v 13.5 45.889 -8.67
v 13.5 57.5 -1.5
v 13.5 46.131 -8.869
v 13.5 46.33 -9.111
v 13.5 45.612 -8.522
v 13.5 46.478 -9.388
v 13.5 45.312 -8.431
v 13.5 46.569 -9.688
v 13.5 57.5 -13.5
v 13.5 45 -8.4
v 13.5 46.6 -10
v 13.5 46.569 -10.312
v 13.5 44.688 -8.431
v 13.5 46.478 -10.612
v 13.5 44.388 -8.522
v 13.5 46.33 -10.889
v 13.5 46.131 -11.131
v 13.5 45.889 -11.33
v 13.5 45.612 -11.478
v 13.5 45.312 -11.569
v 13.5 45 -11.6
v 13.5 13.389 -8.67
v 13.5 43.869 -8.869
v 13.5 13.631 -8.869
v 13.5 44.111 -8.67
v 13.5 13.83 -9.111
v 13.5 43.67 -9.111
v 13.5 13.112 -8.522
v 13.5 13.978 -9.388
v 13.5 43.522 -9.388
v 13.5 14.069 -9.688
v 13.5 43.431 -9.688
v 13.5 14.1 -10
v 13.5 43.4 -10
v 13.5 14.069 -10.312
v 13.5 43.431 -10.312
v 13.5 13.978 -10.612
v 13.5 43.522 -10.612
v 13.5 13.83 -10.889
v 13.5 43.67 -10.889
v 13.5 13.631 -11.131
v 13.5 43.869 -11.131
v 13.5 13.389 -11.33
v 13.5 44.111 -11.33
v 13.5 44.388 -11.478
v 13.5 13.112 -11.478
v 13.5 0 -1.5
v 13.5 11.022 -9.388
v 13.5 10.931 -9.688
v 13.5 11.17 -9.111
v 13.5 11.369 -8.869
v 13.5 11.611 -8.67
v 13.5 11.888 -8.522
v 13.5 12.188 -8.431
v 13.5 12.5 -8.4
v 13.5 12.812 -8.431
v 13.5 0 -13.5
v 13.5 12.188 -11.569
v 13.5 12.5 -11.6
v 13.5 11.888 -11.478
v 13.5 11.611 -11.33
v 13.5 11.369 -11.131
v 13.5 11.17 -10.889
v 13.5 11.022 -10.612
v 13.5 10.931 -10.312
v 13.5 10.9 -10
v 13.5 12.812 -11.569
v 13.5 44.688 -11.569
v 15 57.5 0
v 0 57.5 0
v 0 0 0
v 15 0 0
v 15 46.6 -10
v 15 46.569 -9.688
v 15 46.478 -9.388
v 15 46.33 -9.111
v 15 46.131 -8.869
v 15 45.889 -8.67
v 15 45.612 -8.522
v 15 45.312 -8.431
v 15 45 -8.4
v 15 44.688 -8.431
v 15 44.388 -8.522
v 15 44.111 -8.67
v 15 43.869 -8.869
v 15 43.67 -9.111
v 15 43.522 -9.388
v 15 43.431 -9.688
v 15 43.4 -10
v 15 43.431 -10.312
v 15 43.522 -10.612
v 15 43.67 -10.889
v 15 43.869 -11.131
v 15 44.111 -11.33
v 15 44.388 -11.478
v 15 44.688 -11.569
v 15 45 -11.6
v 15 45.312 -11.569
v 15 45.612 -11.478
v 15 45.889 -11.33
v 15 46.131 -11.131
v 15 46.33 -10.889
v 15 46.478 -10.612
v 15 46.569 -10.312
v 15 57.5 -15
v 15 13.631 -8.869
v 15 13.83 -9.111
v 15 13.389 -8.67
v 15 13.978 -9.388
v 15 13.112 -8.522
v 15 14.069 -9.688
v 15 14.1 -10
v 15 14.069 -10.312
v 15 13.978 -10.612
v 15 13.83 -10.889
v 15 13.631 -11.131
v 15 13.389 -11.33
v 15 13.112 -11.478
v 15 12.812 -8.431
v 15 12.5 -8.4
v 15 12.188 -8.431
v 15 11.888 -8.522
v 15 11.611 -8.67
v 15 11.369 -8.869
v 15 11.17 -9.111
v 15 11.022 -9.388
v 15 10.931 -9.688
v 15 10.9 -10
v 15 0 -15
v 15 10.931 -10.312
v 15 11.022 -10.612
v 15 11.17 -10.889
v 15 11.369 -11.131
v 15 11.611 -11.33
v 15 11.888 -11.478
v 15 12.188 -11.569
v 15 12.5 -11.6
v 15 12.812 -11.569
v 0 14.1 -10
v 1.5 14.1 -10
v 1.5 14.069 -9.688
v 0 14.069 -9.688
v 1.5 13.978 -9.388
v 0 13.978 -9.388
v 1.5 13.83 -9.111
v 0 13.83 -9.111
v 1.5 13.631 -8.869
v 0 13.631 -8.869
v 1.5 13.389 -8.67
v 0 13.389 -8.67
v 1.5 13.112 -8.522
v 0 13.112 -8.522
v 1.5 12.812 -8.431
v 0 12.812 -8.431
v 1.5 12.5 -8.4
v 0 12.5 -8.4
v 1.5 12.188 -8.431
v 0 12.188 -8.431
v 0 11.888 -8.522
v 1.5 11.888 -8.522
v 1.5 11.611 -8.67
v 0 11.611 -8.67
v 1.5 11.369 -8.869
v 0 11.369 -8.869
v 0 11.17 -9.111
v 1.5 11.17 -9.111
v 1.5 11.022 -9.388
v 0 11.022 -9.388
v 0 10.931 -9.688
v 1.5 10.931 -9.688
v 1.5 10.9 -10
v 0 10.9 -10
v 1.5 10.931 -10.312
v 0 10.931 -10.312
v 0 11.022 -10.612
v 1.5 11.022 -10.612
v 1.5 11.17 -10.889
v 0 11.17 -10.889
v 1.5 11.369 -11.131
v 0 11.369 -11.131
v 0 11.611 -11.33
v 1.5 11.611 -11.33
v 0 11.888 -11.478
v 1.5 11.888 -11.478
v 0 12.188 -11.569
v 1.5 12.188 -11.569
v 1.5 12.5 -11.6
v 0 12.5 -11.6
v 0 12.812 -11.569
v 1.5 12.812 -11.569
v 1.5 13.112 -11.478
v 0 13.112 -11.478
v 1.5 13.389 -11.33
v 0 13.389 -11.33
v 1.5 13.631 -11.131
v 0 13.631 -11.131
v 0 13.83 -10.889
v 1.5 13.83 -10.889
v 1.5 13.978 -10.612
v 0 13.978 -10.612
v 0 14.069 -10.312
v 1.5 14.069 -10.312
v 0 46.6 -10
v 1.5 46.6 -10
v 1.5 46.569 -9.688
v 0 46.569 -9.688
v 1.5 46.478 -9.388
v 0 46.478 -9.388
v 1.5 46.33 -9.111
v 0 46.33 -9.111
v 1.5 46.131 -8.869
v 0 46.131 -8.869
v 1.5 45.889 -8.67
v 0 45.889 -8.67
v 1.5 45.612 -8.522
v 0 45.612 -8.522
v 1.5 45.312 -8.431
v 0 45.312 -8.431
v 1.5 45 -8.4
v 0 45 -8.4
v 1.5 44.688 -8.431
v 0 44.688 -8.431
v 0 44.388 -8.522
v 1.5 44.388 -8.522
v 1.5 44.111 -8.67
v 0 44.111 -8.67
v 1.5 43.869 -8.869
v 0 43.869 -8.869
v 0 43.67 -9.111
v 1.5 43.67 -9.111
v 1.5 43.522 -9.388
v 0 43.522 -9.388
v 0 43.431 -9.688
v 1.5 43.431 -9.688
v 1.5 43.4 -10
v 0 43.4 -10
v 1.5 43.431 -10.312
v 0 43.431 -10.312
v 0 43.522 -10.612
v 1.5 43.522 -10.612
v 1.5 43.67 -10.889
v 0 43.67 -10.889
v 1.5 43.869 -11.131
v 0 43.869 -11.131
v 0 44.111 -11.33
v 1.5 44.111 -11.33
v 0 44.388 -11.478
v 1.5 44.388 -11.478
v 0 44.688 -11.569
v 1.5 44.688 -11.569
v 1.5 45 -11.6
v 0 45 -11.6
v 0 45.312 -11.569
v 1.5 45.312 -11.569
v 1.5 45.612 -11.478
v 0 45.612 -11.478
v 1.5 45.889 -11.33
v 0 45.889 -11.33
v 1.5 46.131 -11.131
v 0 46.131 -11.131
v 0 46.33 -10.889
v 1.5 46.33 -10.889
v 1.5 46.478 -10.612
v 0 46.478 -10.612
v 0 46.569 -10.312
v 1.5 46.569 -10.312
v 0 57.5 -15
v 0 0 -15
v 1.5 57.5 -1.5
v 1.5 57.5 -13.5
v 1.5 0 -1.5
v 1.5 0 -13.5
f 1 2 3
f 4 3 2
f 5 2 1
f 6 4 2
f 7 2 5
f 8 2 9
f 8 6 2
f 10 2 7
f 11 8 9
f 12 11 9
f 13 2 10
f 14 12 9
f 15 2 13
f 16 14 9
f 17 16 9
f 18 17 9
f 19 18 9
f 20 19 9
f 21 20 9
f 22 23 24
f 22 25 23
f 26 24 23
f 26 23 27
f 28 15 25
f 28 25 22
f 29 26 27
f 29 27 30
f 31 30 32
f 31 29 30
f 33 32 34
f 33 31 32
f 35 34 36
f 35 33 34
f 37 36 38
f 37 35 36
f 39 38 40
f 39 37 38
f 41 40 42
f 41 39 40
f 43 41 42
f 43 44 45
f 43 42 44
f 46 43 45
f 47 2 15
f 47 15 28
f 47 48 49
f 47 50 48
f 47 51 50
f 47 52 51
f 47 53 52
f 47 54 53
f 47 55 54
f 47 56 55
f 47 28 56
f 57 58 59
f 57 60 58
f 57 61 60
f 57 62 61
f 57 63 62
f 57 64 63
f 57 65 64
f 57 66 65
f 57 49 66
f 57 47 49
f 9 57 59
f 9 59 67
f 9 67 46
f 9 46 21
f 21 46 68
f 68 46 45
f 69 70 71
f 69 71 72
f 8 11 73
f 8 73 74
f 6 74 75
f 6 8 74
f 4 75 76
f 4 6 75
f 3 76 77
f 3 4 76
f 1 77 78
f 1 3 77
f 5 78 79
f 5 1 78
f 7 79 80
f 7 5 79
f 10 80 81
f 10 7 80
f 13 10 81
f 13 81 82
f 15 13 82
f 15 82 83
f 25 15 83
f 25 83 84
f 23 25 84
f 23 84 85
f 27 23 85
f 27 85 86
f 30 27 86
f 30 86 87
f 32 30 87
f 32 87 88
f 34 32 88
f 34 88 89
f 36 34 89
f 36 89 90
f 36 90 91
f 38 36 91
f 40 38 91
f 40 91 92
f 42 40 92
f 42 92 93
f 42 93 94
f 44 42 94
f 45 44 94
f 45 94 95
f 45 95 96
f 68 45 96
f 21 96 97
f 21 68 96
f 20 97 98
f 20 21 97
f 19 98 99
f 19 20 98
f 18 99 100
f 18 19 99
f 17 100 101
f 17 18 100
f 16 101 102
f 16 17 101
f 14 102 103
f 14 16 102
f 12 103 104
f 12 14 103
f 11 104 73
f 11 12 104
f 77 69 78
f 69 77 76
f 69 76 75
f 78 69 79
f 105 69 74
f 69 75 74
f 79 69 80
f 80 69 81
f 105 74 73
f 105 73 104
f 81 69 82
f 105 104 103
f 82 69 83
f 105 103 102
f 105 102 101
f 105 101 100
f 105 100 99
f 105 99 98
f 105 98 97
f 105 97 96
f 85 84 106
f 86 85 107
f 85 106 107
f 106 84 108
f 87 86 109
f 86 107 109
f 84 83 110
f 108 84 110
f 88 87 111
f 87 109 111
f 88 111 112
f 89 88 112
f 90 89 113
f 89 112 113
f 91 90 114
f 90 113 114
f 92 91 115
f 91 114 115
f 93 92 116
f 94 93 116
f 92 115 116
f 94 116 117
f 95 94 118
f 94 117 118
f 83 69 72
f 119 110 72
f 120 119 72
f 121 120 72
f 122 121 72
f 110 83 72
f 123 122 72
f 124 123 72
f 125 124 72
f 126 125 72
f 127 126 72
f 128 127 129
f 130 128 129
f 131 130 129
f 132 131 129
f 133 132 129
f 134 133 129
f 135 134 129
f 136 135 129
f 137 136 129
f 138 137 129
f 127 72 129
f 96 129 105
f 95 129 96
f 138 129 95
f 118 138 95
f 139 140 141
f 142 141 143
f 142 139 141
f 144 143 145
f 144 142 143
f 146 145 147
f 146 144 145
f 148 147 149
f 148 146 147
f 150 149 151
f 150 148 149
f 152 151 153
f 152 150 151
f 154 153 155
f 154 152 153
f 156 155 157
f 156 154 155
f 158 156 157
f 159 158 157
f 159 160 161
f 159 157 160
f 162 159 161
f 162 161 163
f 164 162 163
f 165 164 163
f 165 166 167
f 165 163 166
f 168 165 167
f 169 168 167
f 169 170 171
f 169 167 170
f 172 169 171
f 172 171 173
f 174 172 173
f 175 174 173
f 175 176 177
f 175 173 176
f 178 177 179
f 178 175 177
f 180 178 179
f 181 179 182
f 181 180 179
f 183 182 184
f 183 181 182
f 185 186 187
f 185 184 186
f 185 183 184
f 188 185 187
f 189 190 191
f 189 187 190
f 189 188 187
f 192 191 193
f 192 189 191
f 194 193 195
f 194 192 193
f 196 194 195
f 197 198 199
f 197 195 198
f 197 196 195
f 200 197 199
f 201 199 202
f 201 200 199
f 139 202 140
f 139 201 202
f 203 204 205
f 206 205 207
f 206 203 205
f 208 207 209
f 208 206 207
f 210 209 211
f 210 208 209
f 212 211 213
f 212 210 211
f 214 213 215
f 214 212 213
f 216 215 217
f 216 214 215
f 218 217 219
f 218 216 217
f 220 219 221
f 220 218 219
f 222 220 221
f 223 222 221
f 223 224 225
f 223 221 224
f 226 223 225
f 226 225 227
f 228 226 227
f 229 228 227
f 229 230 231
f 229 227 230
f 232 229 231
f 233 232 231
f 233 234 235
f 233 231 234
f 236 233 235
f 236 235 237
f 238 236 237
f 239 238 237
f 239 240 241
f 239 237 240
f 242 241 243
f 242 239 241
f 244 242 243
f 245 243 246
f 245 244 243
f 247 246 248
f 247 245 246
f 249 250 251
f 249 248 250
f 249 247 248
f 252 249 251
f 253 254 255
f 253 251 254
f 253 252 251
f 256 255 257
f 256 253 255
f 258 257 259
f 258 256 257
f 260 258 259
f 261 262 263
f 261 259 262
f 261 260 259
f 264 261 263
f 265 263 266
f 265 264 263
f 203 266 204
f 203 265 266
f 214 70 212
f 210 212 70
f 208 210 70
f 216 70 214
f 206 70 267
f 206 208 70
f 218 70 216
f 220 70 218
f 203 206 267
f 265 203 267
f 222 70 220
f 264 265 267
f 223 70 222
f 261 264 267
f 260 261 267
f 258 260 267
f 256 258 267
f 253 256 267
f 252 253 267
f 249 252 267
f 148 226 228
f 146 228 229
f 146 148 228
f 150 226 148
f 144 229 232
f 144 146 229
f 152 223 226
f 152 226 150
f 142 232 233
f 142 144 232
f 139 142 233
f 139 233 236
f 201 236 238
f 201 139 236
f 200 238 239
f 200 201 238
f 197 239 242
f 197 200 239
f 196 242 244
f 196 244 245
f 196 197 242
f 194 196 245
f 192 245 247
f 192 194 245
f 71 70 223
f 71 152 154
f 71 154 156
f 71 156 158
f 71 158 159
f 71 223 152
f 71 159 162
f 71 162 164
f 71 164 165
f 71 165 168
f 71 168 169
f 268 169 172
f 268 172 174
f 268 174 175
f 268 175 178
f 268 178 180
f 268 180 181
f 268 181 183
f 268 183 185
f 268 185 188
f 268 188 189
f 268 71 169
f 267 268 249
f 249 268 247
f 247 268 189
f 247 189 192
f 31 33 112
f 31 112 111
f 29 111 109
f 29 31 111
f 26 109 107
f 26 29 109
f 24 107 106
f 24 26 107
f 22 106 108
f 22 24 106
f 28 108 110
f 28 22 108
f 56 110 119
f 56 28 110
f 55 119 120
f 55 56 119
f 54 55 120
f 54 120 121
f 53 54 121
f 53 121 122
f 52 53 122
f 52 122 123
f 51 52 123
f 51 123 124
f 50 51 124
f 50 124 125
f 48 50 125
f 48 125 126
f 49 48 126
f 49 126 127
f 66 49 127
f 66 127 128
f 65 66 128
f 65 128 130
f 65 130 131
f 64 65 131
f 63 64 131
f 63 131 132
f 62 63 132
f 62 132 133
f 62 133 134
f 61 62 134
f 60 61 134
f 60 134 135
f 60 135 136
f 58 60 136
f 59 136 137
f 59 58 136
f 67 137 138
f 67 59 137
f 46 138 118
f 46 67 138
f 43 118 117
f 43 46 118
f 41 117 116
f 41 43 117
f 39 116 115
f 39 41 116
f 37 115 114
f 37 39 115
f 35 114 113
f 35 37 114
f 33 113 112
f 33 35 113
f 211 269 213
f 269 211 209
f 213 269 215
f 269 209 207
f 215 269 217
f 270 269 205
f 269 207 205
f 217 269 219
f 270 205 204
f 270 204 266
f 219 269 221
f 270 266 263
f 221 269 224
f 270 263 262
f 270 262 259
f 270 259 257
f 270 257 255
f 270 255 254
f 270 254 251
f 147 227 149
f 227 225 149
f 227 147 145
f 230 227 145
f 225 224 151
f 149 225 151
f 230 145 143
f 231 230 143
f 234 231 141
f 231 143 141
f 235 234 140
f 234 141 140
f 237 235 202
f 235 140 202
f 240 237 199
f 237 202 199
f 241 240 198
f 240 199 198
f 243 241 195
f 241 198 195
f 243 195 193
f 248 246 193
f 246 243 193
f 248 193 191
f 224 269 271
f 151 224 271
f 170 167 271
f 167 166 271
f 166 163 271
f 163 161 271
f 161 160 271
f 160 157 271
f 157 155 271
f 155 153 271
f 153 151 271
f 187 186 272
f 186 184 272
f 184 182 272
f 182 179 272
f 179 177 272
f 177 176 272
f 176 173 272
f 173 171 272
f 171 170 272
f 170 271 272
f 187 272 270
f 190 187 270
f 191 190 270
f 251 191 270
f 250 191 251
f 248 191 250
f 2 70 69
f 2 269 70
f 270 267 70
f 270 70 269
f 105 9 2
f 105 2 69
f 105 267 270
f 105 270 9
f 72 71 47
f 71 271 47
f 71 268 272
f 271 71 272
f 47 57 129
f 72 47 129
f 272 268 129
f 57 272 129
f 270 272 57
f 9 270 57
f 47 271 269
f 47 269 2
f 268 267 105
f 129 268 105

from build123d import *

# Parameters (mm, degrees)
SKETCH_1_W              = 15
SKETCH_1_H              = 15
SKETCH_1_W_2            = 12
SKETCH_1_H_2            = 12
EXTRUDE_1_DEPTH         = 57.5
CUT_EXTRUDE_1_OUTLINE_R = 1.6
CUT_EXTRUDE_1_DEPTH     = 15


# Read off the part's stored shape, not the designer's step: 切除-拉伸1
with BuildPart() as part:
    # 草图1 → 凸台-拉伸1 (new body)
    with BuildSketch(Plane(origin=(0, 0, 0), x_dir=(1, 0, 0), z_dir=(0, 1, 0))):
        with Locations((7.5, 7.5)):
            Rectangle(SKETCH_1_W, SKETCH_1_H)
        with Locations((7.5, 7.5)):
            Rectangle(SKETCH_1_W_2, SKETCH_1_H_2, mode=Mode.SUBTRACT)
    extrude(amount=EXTRUDE_1_DEPTH)

    # 切除-拉伸1 outline → 切除-拉伸1 (cut)
    with BuildSketch(Plane.YZ):
        with Locations((45, -10)):
            Circle(CUT_EXTRUDE_1_OUTLINE_R)
        with Locations((12.5, -10)):
            Circle(CUT_EXTRUDE_1_OUTLINE_R)
    extrude(amount=CUT_EXTRUDE_1_DEPTH, mode=Mode.SUBTRACT)


solid = part.part
